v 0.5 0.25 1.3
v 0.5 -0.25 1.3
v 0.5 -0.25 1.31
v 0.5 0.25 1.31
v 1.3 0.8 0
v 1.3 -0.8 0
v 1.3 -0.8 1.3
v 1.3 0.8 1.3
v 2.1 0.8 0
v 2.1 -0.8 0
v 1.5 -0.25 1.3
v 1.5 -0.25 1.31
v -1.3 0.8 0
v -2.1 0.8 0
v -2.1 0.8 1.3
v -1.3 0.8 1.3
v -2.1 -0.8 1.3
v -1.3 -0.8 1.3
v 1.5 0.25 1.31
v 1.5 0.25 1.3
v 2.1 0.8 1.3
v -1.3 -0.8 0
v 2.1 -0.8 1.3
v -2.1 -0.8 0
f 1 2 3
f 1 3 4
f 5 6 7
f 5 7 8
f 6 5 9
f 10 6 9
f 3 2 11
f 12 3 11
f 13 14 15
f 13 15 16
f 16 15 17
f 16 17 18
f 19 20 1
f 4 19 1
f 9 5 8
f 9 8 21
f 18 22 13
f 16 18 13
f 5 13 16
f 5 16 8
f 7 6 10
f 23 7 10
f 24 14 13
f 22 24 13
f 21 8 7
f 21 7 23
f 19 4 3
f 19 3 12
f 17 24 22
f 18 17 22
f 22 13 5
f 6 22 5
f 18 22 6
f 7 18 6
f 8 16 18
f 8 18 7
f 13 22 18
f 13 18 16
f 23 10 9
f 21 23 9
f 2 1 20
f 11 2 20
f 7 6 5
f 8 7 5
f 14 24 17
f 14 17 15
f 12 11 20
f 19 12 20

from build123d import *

# Parameters (mm, degrees)
F0_W     = 0.8
F0_H     = 1.6
F1_DEPTH = 1.3
F2_DEPTH = 1.3
F0_W_2   = 2.6
F3_DEPTH = 1.3
F4_W     = 0.8
F4_H     = 0.5
F4_W_2   = 0.2
F5_DEPTH = 0.01


with BuildPart() as f1:
    # F0 (on Top) → F1 (new body)
    with BuildSketch(Plane.XY):
        with Locations((1.7, 0)):
            Rectangle(F0_W, F0_H)
    extrude(amount=F1_DEPTH)


with BuildPart() as f2:
    # F0 (on Top) → F2 (new body)
    with BuildSketch(Plane.XY):
        with Locations((-1.7, 0)):
            Rectangle(F0_W, F0_H)
    extrude(amount=F2_DEPTH)


with BuildPart() as f3:
    # F0 (on Top) → F3 (new body)
    with BuildSketch(Plane.XY):
        Rectangle(F0_W_2, F0_H)
    extrude(amount=F3_DEPTH)


with BuildPart() as f5:
    # F4 (on face) → F5 (new body)
    with BuildSketch(Plane.XY.offset(1.3)):
        with Locations((0.9, 0)):
            Rectangle(F4_W, F4_H)
        with Locations((1.4, 0)):
            Rectangle(F4_W_2, F4_H)
    extrude(amount=F5_DEPTH)


solid = Compound([f1.part, f2.part, f3.part, f5.part])
